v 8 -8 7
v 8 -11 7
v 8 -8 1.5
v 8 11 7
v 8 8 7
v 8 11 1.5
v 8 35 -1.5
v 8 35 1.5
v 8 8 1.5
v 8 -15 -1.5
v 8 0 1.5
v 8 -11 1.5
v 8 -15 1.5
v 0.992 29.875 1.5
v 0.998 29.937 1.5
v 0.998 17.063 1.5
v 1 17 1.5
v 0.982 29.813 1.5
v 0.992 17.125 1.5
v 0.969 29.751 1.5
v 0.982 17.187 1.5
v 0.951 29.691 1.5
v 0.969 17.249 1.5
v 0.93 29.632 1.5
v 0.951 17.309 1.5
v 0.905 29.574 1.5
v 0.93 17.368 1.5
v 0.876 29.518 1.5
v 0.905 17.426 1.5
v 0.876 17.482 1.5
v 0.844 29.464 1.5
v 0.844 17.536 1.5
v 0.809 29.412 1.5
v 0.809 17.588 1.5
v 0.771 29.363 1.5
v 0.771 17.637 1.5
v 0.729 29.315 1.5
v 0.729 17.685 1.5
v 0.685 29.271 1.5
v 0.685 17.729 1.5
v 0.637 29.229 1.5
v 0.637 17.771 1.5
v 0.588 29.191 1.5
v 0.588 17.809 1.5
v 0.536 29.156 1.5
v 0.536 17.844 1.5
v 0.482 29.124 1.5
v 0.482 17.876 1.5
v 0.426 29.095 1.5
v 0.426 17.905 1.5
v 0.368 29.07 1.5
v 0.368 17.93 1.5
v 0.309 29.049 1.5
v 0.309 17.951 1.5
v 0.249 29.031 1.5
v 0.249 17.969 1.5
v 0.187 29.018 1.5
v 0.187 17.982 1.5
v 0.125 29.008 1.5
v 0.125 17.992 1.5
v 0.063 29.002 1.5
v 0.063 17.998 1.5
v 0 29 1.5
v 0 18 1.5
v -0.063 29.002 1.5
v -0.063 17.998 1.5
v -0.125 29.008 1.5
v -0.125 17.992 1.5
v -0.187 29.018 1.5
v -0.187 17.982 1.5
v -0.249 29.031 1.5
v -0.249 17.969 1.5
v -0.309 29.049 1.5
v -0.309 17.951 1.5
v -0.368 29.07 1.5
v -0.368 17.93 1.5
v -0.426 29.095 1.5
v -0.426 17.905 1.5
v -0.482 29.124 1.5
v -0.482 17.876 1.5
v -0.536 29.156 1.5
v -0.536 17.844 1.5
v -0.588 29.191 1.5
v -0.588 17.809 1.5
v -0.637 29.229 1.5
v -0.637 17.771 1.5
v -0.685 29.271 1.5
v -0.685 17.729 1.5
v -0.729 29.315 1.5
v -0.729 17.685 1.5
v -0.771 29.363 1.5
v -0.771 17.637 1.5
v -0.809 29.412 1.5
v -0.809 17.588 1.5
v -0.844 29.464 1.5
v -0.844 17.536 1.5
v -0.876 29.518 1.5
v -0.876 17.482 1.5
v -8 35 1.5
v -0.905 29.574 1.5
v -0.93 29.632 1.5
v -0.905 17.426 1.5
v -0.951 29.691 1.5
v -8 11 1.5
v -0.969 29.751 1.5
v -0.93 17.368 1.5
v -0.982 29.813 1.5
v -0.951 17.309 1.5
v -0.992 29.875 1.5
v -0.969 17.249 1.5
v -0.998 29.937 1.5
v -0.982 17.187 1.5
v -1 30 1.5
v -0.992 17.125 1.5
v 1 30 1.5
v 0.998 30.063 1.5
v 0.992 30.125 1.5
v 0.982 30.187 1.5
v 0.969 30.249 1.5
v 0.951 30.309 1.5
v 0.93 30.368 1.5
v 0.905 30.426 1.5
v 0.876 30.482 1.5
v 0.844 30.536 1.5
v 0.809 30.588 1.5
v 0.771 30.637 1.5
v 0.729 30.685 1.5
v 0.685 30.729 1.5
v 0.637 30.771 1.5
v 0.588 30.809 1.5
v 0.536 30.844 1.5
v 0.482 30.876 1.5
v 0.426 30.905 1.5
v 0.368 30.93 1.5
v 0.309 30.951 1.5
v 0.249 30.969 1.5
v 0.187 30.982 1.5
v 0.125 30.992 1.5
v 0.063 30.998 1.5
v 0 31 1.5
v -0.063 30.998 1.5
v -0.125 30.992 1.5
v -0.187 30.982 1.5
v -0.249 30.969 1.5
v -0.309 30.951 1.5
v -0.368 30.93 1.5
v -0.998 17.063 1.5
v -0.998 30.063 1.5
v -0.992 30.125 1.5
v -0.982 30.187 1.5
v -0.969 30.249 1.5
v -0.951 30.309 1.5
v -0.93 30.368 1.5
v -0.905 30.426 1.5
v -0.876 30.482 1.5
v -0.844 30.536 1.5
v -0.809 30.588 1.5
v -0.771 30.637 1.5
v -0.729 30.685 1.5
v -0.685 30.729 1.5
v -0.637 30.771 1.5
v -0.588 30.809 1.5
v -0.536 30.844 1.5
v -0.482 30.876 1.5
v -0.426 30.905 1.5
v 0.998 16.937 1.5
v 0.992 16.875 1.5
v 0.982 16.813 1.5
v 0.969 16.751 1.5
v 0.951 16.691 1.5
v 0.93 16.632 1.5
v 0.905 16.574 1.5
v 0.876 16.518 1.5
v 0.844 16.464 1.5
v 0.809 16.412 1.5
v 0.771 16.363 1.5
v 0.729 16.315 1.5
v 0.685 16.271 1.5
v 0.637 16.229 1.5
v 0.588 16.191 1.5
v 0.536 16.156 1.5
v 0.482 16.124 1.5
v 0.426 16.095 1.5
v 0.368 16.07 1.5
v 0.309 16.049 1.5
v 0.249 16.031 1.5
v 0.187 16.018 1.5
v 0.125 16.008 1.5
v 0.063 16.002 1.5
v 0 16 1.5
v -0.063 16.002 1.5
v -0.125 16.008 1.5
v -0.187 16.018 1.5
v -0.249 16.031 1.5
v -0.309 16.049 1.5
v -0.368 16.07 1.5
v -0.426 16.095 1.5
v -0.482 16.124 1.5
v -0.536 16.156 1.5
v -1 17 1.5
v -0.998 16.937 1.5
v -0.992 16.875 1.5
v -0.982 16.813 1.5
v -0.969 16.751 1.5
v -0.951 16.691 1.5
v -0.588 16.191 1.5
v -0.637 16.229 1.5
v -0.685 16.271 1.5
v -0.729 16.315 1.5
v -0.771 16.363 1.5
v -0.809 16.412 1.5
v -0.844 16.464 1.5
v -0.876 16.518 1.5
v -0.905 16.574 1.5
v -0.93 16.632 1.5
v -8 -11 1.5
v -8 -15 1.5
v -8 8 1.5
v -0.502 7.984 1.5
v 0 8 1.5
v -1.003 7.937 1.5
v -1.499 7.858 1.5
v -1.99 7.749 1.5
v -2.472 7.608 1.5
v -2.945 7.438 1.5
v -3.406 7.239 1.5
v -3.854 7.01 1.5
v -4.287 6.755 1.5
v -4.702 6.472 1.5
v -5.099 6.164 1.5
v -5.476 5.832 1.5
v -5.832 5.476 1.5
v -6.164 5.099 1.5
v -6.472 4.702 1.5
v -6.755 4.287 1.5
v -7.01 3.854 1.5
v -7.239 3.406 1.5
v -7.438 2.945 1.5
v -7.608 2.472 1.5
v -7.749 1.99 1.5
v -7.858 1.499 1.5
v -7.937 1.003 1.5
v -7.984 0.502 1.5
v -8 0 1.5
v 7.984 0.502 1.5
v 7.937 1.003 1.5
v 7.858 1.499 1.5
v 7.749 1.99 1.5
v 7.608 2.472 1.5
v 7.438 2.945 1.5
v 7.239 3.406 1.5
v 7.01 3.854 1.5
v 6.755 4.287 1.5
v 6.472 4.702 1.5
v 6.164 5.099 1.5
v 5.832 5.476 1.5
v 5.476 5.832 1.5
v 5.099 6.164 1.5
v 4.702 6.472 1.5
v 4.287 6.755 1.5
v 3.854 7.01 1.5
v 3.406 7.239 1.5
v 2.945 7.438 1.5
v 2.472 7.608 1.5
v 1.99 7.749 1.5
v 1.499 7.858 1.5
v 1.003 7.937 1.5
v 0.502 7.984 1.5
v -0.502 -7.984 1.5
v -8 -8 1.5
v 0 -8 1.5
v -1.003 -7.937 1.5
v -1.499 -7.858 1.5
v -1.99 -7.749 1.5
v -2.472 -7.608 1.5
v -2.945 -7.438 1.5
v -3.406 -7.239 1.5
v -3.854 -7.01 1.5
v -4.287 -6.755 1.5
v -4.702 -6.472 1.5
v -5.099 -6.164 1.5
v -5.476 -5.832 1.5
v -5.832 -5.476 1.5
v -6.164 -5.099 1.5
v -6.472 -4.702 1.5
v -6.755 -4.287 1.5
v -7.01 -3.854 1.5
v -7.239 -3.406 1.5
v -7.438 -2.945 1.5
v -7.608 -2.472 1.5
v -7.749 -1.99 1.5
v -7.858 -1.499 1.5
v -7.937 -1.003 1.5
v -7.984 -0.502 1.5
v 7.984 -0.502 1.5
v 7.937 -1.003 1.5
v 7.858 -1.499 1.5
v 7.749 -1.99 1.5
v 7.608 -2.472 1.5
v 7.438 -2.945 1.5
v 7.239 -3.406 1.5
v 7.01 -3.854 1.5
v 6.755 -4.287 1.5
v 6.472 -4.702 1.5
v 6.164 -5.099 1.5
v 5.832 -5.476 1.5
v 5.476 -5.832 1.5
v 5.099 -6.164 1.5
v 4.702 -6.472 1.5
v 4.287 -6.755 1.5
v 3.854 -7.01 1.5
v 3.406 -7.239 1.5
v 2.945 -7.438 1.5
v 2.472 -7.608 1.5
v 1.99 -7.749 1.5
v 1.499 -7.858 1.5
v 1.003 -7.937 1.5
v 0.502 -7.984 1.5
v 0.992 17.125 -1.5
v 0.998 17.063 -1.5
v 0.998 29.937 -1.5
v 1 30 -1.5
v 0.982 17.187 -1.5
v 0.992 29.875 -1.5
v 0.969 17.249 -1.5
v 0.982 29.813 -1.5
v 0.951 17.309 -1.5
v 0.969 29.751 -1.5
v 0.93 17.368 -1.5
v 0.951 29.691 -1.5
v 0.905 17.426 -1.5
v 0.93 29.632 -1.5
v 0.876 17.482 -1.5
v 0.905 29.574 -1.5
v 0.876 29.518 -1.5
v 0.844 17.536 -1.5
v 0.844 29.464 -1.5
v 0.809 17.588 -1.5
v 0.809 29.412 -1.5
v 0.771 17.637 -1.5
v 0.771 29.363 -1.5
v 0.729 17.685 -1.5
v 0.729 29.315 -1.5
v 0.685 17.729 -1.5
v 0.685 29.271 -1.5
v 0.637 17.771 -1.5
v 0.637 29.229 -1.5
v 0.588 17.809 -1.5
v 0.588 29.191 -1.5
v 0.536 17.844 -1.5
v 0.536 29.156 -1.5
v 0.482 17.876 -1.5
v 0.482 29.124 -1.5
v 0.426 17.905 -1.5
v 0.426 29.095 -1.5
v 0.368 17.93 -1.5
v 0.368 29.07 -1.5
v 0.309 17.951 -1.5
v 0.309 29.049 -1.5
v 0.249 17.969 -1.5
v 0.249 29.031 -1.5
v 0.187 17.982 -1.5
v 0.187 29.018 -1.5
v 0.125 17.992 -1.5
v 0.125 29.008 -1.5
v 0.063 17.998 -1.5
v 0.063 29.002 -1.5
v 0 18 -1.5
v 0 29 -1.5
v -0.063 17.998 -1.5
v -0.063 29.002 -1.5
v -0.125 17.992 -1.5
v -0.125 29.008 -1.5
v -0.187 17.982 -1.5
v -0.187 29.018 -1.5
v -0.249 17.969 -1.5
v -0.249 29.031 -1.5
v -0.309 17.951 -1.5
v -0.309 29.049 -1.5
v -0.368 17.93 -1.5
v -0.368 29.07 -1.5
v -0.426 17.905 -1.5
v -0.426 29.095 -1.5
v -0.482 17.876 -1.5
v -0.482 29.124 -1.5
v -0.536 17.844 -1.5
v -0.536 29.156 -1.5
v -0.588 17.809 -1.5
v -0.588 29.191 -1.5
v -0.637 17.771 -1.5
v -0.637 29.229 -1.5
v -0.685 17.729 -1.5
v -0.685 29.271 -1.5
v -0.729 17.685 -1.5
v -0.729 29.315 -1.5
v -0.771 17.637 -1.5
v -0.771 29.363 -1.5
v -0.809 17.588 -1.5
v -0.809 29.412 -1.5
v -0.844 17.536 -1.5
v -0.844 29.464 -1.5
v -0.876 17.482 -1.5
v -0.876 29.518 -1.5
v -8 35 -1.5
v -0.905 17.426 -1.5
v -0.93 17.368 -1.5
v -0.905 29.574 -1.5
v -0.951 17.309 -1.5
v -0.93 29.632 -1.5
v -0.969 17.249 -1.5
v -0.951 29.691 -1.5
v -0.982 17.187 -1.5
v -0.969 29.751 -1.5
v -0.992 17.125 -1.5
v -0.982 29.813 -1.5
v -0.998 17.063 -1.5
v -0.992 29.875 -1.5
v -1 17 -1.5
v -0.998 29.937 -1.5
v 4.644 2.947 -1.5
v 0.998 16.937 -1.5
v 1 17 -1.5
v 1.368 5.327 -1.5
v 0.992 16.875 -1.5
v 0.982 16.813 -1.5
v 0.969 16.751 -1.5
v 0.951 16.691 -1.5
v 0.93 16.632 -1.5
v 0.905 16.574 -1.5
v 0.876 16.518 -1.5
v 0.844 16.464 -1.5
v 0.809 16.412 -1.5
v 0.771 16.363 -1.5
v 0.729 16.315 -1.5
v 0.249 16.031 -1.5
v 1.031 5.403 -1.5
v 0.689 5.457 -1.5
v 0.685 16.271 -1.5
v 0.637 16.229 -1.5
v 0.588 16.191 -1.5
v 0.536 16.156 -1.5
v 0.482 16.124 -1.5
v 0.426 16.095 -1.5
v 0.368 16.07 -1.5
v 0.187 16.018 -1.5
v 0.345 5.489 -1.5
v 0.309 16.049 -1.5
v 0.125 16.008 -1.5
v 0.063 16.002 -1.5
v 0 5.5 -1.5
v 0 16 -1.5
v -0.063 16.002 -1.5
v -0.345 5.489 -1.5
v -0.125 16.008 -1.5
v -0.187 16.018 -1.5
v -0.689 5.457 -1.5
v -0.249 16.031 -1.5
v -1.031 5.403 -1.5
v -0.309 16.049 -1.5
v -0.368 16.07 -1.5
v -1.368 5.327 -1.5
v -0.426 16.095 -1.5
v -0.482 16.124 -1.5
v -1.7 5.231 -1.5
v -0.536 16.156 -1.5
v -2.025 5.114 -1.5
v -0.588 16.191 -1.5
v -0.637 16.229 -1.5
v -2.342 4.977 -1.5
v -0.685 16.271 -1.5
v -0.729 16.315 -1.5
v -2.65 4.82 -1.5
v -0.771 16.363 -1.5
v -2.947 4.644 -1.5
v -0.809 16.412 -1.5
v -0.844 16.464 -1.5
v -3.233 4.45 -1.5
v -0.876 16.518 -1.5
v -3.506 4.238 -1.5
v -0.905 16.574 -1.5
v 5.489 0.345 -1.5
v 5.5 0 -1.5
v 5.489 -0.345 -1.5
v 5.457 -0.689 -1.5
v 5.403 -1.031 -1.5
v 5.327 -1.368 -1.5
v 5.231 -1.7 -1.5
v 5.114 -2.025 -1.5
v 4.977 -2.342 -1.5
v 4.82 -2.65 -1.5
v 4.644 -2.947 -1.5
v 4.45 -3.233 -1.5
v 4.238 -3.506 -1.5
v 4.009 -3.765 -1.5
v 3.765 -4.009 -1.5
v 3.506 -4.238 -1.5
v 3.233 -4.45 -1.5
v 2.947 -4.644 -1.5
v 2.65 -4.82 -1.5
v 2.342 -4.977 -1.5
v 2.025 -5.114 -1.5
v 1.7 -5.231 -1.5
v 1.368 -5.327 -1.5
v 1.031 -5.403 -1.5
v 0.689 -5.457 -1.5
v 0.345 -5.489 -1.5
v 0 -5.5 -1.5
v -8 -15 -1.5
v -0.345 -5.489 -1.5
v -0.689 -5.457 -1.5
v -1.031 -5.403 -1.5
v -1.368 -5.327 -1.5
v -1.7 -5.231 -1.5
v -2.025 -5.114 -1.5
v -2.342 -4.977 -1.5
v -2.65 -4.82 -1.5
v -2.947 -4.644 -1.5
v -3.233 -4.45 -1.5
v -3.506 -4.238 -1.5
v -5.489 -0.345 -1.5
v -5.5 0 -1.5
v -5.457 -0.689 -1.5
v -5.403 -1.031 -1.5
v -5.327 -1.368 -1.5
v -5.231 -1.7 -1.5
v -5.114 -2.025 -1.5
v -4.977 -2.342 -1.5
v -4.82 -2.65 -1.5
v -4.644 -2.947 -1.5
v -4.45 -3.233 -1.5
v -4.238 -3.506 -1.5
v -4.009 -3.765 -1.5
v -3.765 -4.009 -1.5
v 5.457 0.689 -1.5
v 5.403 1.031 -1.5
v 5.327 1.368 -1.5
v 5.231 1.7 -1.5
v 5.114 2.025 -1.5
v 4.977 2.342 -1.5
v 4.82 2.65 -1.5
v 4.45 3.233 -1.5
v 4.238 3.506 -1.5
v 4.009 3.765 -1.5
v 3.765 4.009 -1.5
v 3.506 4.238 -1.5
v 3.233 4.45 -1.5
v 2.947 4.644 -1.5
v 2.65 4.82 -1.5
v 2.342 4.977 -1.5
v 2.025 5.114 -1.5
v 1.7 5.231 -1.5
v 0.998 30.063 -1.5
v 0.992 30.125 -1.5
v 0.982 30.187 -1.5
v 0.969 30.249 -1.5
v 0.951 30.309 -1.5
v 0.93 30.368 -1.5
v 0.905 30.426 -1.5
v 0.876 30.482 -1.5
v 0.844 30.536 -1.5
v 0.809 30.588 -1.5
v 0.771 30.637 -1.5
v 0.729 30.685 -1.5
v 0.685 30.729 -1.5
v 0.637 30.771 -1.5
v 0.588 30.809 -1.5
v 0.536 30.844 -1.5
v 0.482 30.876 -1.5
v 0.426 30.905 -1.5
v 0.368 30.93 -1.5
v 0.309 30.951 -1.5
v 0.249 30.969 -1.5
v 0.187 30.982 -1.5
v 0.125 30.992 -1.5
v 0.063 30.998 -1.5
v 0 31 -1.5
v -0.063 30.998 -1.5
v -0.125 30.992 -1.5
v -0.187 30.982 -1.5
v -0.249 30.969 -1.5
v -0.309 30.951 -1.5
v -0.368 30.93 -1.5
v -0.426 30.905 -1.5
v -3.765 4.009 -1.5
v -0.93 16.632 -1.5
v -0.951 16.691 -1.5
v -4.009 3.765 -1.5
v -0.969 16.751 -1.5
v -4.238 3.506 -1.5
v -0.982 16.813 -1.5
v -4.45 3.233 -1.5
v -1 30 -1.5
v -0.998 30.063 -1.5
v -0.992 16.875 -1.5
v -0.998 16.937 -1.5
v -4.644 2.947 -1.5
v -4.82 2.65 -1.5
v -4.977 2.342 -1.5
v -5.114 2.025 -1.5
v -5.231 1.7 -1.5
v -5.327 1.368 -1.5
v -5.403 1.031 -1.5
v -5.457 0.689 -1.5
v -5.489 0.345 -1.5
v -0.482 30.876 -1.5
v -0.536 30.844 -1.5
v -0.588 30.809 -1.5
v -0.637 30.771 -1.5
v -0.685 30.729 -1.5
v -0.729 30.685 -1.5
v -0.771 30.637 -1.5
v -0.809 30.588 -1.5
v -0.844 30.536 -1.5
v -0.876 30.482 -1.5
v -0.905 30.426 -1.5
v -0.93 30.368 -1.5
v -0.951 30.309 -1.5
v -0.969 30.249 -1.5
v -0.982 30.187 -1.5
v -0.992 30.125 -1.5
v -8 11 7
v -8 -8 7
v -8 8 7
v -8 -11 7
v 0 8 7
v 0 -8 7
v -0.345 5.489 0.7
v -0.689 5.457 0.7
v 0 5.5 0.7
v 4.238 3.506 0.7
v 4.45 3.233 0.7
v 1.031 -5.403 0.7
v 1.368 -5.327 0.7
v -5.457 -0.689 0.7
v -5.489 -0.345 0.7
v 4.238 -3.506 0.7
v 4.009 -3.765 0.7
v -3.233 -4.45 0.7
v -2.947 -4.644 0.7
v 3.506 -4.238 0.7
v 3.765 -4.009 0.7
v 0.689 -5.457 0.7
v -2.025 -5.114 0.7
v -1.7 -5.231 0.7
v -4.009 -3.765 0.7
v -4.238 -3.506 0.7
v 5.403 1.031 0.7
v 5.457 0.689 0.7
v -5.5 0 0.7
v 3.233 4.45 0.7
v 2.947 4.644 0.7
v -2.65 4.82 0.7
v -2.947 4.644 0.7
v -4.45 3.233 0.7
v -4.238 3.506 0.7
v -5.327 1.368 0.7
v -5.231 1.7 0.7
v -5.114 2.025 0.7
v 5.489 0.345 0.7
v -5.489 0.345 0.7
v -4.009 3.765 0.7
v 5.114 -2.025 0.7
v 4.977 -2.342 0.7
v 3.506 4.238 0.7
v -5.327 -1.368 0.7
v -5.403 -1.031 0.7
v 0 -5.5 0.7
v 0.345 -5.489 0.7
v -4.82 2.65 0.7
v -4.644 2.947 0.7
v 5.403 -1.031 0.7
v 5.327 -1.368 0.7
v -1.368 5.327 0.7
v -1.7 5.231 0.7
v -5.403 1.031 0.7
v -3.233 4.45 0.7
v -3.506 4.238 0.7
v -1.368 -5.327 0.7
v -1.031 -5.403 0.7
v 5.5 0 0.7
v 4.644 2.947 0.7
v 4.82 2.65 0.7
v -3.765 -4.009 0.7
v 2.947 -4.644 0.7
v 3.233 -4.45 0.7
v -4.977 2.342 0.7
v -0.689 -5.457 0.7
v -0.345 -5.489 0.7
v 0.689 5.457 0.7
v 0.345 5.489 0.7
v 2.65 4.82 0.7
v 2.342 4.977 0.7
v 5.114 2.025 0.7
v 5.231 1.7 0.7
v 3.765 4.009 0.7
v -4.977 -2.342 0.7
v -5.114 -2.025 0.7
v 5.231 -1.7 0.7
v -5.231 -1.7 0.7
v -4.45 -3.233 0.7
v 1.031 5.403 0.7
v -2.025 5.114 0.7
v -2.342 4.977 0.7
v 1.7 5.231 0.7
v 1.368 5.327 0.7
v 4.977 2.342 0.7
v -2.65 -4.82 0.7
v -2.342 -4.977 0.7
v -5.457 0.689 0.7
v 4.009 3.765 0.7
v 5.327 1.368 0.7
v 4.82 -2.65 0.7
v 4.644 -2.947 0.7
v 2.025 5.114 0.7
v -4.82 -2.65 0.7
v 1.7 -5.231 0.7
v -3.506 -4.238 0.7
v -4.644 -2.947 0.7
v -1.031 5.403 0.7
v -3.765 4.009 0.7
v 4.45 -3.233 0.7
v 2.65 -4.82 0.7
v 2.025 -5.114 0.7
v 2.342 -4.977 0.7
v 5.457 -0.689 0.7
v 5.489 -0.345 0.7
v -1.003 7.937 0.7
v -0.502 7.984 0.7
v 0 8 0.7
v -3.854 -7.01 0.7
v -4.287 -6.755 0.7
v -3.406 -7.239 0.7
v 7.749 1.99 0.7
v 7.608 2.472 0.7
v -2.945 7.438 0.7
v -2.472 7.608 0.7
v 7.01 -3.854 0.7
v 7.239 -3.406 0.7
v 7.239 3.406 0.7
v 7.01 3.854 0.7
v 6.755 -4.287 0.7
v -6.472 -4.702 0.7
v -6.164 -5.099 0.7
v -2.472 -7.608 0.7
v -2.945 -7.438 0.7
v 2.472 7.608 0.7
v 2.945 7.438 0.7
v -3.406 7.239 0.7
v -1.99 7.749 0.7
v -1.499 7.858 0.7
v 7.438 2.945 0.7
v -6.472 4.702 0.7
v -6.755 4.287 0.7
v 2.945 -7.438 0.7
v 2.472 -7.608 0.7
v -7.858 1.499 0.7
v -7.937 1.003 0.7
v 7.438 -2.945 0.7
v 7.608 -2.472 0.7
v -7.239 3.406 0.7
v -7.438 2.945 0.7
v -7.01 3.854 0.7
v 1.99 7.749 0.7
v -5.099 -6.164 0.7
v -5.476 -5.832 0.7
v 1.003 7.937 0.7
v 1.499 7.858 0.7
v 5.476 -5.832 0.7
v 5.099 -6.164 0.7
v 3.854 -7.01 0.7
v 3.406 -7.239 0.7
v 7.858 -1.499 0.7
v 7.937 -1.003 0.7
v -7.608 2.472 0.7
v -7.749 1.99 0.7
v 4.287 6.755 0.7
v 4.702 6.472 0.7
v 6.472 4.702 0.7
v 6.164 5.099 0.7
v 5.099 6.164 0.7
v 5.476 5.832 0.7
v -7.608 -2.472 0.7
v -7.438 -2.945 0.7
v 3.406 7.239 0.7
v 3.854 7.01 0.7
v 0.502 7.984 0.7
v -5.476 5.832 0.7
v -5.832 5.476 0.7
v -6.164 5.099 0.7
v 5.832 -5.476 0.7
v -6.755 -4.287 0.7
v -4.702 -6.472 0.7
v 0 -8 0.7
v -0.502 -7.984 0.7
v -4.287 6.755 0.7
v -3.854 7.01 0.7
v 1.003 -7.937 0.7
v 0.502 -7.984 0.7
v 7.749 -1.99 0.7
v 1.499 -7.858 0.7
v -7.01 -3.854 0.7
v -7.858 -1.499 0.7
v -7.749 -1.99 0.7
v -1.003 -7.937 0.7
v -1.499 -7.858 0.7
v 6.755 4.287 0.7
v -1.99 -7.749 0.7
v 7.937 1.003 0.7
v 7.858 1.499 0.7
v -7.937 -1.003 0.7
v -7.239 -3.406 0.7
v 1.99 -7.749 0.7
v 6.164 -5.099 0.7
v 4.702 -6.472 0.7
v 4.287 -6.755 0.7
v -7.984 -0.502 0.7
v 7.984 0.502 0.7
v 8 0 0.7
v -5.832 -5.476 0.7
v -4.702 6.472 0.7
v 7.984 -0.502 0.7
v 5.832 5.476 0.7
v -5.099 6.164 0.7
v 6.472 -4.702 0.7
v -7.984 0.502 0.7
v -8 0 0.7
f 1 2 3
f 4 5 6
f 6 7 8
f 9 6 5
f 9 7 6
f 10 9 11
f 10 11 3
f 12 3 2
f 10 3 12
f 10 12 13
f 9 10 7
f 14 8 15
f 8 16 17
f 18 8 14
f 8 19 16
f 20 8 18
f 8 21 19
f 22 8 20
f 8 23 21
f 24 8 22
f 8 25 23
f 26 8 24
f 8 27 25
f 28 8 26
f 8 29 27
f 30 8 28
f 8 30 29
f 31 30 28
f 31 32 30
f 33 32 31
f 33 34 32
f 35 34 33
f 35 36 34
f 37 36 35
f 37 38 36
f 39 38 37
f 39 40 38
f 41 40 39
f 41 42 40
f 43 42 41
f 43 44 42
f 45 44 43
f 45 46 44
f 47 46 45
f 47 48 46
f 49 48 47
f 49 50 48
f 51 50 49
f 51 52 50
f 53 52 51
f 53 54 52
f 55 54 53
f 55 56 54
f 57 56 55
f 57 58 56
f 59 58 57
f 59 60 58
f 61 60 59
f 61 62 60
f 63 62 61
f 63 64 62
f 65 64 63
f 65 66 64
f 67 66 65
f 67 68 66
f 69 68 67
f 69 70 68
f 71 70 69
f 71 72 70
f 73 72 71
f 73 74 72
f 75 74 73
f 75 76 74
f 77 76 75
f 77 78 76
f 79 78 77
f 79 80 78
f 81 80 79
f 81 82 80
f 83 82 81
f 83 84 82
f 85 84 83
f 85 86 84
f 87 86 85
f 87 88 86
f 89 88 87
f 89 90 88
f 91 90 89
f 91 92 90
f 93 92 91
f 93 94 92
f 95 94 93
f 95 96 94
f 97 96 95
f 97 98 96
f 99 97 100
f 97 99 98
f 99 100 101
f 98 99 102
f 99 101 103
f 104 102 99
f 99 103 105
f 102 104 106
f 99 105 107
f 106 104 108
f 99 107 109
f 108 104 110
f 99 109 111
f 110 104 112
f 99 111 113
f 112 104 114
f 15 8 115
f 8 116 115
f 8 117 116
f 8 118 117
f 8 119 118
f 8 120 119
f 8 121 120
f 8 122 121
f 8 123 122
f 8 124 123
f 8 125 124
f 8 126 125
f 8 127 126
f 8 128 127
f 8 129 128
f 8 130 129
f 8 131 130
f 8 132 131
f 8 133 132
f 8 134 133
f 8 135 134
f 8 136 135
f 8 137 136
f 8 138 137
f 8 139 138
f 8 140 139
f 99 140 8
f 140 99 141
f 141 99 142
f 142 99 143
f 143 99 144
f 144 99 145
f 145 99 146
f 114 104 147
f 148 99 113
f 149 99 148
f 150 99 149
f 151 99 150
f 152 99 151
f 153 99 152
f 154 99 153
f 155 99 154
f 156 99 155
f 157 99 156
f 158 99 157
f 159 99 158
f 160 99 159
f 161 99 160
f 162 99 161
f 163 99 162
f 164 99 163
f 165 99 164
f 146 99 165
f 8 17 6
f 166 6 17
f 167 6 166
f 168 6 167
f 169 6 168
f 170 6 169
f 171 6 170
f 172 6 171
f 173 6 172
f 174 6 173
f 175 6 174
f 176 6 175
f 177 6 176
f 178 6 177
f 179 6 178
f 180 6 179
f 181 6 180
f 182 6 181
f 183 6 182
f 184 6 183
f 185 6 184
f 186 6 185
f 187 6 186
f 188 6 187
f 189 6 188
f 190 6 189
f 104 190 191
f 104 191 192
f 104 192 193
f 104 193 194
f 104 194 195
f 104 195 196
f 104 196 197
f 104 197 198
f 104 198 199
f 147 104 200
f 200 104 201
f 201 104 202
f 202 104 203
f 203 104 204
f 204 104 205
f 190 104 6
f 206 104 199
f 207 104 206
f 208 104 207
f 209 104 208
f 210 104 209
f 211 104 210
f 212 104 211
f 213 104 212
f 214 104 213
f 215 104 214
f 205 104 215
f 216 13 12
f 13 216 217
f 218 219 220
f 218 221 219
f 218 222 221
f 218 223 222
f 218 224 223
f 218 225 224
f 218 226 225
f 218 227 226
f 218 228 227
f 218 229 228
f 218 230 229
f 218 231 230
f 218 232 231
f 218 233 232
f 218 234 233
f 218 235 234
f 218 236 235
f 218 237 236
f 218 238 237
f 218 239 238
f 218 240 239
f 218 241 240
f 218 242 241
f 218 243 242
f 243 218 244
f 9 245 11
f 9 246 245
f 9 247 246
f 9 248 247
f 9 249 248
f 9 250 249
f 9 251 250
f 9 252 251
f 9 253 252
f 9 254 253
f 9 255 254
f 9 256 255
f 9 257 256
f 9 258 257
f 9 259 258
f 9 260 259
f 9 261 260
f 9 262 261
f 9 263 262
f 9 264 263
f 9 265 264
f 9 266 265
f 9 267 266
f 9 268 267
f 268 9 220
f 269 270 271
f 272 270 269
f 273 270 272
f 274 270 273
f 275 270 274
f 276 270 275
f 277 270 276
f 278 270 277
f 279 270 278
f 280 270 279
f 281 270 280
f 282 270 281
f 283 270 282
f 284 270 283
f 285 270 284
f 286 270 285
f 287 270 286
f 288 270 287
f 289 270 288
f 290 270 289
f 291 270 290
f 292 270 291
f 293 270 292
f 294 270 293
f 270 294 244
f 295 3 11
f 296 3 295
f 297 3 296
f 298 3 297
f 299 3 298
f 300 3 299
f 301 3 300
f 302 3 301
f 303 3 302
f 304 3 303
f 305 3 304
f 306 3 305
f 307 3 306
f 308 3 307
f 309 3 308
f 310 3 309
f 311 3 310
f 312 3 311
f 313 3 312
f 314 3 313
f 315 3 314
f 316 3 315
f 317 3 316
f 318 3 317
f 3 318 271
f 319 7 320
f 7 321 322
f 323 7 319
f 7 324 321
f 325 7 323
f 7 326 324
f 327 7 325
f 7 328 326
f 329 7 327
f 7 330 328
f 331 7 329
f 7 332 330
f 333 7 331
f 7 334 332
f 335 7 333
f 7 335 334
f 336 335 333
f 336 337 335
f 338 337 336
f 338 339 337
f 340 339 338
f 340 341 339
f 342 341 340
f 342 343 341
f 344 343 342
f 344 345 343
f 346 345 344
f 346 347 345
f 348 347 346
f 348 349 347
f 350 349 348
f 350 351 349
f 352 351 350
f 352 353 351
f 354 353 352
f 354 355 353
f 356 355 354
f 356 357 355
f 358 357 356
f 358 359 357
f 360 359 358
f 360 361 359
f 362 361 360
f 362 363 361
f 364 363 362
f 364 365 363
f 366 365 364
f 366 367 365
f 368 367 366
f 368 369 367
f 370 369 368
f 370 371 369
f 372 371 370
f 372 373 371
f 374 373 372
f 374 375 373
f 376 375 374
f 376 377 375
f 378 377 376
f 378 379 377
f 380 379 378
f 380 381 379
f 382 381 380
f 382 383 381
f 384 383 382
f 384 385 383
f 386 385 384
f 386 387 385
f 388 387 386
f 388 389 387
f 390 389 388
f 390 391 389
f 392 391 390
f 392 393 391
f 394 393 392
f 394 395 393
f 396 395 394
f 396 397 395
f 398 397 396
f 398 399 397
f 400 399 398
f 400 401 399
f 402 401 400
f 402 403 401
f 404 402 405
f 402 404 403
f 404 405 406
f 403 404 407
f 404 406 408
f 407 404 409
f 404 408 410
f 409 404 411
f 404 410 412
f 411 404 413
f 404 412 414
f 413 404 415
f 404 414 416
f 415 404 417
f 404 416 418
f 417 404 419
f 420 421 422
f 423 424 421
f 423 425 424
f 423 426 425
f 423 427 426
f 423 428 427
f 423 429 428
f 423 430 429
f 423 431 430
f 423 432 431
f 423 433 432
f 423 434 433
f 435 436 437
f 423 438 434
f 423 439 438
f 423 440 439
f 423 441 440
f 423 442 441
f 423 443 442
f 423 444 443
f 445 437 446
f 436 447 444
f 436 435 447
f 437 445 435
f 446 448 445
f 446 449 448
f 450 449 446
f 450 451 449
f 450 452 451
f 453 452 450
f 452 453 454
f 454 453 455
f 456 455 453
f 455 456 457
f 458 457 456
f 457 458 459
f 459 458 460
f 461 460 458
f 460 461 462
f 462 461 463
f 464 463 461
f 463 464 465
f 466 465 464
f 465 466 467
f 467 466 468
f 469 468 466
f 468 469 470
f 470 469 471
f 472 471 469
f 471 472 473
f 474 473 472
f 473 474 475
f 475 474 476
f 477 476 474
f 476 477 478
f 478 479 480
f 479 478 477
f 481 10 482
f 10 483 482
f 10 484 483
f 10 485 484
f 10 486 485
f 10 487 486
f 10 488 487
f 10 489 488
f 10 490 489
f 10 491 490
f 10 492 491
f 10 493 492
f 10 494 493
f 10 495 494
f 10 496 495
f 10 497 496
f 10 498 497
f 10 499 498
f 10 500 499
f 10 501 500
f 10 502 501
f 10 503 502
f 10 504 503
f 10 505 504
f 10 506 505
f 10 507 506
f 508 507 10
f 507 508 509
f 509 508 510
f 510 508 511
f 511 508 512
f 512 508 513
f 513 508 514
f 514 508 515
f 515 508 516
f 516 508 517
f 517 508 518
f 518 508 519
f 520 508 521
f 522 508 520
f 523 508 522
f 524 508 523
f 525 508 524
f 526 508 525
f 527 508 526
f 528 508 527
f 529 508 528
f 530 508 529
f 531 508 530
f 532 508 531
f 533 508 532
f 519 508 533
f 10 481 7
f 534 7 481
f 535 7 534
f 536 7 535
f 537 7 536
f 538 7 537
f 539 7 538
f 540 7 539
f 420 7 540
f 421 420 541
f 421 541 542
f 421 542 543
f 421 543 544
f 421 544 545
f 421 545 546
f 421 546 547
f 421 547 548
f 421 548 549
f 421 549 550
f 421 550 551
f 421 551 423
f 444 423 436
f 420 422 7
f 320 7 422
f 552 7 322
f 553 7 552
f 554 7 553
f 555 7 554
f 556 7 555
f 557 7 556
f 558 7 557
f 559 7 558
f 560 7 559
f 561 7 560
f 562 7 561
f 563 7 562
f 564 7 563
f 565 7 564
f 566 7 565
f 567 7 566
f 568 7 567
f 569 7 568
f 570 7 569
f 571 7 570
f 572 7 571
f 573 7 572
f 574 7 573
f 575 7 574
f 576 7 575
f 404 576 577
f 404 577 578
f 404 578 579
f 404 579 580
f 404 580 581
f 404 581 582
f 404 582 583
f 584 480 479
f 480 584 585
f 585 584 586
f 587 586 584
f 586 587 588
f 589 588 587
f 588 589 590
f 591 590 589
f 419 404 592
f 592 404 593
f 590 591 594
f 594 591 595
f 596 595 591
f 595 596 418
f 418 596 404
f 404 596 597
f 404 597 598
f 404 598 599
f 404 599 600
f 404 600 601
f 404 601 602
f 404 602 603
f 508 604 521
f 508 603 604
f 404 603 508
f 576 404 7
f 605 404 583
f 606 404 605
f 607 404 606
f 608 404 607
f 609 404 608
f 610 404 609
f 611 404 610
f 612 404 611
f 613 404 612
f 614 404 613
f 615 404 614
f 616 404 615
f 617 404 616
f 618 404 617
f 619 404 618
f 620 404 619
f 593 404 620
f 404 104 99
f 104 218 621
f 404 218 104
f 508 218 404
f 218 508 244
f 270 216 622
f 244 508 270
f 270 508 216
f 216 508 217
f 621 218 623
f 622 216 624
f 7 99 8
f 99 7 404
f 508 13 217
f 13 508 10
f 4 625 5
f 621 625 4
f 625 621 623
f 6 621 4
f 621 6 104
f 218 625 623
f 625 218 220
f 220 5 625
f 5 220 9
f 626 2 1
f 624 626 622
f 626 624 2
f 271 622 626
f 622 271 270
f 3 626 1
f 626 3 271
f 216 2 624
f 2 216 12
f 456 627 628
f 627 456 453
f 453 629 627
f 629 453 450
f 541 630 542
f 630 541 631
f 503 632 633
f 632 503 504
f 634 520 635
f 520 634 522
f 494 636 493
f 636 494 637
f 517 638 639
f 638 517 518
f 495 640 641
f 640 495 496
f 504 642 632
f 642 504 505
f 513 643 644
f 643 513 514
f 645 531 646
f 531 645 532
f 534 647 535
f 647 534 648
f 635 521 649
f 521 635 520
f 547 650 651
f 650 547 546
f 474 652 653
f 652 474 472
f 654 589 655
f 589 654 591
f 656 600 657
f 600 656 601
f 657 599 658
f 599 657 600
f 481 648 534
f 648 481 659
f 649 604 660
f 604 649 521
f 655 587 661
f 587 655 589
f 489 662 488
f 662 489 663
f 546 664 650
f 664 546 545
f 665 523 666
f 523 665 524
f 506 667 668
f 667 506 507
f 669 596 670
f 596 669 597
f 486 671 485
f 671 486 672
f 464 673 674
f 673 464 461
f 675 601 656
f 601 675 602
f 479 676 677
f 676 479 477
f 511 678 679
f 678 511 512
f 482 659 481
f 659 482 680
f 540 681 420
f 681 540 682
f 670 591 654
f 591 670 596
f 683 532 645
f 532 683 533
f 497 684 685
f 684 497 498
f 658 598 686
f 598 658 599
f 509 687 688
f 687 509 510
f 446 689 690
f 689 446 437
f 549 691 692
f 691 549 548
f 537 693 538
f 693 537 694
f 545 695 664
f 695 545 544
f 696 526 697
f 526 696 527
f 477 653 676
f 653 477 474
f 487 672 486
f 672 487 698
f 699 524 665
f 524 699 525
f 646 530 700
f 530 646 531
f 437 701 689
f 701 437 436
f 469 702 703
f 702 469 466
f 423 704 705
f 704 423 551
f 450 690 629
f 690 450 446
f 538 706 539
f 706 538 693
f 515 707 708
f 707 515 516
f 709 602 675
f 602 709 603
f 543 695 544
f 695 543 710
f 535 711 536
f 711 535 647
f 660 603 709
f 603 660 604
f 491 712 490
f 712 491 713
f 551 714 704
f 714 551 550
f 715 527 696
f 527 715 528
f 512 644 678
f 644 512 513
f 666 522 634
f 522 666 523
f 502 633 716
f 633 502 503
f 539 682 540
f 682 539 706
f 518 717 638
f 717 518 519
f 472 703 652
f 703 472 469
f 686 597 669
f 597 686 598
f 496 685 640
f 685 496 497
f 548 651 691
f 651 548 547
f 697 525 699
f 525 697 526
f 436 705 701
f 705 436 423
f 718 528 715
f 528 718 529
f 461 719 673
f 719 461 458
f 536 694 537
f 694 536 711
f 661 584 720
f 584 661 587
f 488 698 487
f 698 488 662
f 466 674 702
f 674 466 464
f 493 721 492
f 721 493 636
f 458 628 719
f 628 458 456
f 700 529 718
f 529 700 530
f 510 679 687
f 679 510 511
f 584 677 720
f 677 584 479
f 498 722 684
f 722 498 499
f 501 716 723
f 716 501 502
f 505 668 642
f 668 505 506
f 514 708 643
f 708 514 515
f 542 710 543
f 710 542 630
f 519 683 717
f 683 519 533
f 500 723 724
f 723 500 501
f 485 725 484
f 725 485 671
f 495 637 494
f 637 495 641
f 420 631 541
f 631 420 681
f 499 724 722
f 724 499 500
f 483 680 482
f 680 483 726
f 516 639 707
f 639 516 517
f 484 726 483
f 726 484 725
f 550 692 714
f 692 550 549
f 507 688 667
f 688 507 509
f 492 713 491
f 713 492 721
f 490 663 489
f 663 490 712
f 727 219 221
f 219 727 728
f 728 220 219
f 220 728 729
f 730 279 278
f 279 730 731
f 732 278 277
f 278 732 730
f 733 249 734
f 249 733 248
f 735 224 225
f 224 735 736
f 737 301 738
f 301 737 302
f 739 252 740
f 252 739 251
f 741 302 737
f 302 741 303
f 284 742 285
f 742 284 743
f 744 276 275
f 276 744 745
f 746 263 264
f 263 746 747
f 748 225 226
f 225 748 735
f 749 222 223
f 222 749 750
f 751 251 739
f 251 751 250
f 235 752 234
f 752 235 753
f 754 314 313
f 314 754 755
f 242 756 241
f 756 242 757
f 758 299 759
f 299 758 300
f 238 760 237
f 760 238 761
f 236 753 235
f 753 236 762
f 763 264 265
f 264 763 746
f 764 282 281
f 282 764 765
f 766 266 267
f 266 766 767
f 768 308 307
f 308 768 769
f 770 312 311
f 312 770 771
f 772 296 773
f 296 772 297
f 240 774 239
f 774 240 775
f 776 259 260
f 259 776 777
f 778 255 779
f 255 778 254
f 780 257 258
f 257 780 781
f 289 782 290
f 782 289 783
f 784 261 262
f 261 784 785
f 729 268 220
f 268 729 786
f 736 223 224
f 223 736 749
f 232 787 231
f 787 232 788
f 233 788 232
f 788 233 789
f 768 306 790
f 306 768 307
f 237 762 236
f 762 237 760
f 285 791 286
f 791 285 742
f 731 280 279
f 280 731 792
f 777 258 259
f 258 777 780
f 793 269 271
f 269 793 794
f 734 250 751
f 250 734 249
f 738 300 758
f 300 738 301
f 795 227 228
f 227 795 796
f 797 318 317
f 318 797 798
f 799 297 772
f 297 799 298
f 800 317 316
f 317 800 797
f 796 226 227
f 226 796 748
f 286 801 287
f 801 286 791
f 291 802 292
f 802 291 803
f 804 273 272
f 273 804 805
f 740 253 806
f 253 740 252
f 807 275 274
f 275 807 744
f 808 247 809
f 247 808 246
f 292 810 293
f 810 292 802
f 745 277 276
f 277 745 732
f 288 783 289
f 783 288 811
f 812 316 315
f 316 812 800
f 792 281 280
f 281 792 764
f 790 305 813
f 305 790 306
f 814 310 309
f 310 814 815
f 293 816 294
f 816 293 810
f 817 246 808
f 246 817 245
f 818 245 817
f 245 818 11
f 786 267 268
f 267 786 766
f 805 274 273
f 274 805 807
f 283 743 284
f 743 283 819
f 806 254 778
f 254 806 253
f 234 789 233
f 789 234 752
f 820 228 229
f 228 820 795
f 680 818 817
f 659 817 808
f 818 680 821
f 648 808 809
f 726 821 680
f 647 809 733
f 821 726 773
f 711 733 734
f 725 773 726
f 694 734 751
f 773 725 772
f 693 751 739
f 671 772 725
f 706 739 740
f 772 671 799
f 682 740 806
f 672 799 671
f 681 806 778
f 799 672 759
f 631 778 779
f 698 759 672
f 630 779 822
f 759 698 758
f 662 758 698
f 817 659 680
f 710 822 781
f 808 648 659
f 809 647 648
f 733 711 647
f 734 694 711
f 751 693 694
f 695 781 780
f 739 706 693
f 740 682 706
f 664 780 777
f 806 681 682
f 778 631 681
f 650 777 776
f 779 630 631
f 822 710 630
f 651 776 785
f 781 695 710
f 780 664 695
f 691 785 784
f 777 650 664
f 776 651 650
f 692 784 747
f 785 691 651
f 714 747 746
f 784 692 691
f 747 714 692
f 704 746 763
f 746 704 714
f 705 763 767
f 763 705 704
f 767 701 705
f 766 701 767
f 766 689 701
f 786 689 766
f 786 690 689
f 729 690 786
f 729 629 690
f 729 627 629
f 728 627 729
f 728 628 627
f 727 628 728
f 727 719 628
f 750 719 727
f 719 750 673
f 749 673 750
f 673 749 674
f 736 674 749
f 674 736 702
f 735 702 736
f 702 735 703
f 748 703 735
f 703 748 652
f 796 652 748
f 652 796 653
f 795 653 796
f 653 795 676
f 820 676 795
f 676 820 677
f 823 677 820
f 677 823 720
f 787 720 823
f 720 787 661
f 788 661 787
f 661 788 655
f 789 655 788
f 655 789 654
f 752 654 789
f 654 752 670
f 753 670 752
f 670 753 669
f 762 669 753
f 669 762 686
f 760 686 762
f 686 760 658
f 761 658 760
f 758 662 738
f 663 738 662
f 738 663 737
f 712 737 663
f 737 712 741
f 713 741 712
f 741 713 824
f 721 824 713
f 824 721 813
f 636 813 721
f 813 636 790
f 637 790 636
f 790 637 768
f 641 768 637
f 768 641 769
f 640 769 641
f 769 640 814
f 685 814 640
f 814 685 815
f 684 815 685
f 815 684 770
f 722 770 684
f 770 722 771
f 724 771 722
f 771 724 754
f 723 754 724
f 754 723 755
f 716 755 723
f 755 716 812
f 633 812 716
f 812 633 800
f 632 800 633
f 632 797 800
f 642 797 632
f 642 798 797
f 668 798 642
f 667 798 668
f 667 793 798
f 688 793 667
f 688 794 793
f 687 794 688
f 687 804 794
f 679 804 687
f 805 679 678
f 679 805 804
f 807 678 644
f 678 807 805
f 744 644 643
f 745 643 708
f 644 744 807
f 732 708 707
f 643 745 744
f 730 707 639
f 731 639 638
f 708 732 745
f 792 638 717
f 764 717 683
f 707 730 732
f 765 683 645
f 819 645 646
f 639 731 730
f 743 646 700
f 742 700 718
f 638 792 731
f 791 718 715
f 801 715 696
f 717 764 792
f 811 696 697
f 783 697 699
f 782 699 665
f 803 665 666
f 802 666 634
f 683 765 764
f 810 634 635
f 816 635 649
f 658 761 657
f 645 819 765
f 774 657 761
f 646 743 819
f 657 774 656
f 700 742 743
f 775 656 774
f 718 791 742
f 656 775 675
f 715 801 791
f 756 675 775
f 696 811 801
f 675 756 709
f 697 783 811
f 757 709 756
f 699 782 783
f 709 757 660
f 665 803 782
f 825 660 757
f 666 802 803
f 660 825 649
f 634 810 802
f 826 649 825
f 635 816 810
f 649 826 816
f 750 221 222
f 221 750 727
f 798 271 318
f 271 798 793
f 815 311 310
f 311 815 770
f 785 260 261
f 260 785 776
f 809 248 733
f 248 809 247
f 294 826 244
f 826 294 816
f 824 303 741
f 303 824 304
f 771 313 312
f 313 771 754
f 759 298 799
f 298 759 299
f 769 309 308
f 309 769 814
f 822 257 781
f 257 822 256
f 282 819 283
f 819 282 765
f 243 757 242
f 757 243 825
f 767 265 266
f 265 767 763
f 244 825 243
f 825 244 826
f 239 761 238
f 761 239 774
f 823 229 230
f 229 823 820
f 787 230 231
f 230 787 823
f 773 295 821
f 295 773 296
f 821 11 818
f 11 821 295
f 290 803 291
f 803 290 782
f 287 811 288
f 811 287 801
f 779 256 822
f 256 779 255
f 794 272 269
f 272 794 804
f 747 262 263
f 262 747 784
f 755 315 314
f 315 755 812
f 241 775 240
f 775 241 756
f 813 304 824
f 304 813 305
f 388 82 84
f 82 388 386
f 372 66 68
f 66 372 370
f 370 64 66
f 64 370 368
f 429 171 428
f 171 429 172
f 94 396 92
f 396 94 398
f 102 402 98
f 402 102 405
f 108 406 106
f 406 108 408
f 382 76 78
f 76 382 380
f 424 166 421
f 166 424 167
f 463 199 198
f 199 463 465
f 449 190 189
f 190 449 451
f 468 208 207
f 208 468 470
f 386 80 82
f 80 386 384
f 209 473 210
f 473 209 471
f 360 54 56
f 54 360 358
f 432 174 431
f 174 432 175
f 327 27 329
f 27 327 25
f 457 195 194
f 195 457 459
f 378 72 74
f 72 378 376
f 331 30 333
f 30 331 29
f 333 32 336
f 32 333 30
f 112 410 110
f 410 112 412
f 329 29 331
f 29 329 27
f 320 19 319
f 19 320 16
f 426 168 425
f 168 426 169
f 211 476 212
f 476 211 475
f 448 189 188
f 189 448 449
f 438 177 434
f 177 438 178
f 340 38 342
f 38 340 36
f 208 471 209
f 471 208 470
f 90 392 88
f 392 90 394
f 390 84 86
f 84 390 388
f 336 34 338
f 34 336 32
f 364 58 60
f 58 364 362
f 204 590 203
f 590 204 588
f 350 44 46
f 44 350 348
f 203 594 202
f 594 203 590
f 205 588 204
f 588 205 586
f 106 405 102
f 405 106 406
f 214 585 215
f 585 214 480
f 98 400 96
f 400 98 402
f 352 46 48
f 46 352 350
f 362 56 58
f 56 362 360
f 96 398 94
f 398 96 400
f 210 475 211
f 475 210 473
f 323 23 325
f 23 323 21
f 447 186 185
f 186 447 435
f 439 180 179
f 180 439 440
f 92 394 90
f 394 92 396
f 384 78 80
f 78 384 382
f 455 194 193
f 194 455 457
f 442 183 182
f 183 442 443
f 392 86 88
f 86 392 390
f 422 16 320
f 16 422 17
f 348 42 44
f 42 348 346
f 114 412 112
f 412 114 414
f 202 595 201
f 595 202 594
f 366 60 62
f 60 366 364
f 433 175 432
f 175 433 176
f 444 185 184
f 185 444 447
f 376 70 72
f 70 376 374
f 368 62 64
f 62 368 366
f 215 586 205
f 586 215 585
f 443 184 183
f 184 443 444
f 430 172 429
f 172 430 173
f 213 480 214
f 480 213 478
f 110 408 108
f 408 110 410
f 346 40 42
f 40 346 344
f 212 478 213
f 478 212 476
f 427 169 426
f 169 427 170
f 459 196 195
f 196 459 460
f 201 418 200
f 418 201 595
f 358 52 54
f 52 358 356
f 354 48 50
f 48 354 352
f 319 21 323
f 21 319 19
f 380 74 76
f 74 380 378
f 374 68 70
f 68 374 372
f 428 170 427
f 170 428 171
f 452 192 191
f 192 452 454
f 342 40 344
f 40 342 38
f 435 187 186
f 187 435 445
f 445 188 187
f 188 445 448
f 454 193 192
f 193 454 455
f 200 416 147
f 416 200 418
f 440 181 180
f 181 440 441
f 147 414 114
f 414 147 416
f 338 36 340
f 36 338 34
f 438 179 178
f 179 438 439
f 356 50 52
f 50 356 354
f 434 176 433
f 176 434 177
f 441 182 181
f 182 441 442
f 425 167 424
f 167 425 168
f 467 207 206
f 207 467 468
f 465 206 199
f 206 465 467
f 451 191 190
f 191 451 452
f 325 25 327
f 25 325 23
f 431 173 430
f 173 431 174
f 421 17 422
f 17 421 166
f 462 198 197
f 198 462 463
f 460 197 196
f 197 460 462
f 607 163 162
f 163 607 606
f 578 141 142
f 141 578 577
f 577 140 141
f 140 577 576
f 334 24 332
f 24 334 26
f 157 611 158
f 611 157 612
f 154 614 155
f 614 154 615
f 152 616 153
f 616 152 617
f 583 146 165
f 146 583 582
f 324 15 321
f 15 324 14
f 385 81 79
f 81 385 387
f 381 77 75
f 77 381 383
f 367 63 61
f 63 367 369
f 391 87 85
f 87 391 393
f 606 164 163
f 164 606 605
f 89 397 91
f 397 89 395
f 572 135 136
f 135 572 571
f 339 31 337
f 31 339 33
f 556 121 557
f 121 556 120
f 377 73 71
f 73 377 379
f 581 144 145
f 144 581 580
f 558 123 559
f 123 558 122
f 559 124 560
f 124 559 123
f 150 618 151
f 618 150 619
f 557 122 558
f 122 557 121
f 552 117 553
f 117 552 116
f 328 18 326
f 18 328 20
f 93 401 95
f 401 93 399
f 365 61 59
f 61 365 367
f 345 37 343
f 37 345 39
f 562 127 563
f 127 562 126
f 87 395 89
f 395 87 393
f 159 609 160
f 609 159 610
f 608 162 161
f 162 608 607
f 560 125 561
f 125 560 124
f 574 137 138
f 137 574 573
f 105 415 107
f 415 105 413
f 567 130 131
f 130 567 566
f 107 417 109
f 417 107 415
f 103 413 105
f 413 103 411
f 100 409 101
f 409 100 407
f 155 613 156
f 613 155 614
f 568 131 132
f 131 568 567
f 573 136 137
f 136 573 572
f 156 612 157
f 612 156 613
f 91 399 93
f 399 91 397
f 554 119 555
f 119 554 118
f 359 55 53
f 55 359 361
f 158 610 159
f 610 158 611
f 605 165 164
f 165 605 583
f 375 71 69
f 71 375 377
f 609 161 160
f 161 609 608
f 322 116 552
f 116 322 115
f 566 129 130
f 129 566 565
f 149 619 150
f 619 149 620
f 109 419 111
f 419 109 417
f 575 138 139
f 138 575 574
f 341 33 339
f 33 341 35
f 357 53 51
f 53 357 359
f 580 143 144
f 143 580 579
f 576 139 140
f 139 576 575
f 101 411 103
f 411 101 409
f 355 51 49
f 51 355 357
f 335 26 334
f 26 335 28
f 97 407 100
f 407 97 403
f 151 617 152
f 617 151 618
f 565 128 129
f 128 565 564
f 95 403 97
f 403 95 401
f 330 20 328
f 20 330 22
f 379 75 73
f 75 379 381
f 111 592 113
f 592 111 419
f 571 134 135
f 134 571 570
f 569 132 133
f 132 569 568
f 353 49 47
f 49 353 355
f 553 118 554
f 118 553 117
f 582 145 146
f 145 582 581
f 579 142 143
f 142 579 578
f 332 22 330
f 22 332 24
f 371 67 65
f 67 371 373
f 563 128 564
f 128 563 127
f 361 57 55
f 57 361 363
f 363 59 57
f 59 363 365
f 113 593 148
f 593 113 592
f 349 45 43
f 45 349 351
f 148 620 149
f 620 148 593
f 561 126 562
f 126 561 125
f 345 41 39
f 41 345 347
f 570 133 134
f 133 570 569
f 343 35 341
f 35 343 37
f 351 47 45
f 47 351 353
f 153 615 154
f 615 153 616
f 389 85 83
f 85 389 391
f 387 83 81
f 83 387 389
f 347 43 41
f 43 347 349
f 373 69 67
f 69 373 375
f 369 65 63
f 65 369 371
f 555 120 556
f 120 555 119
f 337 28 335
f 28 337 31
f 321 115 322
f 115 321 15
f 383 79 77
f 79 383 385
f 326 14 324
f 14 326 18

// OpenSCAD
difference(){
	union(){
        
       translate([0,10,0]){
           cube([16,50,3], center=true);
       }
        translate([0,1.5+16/2,3]){
           cube([16,3,8], center=true);
       }
        translate([0,-1.5-16/2,3]){
           cube([16,3,8], center=true);
       }

	}
	union() {
       translate([0,0,0]){
            rotate(a = [0,0,90]) {
              cylinder(h=600, r=5.5, $fn=100, center=true);
            }
       }		   
       translate([0,0,0.7]){
            rotate(a = [0,0,90]) {
              cylinder(h=600, r=8, $fn=100, center=false);
            }
       }		       
       translate([0,17,0]){
            rotate(a = [0,0,90]) {
              cylinder(h=600, r=1, $fn=100, center=true);
            }
       }			   
       translate([0,30,0]){
            rotate(a = [0,0,90]) {
              cylinder(h=600, r=1, $fn=100, center=true);
            }
       }			   
		   

        
	}
}
